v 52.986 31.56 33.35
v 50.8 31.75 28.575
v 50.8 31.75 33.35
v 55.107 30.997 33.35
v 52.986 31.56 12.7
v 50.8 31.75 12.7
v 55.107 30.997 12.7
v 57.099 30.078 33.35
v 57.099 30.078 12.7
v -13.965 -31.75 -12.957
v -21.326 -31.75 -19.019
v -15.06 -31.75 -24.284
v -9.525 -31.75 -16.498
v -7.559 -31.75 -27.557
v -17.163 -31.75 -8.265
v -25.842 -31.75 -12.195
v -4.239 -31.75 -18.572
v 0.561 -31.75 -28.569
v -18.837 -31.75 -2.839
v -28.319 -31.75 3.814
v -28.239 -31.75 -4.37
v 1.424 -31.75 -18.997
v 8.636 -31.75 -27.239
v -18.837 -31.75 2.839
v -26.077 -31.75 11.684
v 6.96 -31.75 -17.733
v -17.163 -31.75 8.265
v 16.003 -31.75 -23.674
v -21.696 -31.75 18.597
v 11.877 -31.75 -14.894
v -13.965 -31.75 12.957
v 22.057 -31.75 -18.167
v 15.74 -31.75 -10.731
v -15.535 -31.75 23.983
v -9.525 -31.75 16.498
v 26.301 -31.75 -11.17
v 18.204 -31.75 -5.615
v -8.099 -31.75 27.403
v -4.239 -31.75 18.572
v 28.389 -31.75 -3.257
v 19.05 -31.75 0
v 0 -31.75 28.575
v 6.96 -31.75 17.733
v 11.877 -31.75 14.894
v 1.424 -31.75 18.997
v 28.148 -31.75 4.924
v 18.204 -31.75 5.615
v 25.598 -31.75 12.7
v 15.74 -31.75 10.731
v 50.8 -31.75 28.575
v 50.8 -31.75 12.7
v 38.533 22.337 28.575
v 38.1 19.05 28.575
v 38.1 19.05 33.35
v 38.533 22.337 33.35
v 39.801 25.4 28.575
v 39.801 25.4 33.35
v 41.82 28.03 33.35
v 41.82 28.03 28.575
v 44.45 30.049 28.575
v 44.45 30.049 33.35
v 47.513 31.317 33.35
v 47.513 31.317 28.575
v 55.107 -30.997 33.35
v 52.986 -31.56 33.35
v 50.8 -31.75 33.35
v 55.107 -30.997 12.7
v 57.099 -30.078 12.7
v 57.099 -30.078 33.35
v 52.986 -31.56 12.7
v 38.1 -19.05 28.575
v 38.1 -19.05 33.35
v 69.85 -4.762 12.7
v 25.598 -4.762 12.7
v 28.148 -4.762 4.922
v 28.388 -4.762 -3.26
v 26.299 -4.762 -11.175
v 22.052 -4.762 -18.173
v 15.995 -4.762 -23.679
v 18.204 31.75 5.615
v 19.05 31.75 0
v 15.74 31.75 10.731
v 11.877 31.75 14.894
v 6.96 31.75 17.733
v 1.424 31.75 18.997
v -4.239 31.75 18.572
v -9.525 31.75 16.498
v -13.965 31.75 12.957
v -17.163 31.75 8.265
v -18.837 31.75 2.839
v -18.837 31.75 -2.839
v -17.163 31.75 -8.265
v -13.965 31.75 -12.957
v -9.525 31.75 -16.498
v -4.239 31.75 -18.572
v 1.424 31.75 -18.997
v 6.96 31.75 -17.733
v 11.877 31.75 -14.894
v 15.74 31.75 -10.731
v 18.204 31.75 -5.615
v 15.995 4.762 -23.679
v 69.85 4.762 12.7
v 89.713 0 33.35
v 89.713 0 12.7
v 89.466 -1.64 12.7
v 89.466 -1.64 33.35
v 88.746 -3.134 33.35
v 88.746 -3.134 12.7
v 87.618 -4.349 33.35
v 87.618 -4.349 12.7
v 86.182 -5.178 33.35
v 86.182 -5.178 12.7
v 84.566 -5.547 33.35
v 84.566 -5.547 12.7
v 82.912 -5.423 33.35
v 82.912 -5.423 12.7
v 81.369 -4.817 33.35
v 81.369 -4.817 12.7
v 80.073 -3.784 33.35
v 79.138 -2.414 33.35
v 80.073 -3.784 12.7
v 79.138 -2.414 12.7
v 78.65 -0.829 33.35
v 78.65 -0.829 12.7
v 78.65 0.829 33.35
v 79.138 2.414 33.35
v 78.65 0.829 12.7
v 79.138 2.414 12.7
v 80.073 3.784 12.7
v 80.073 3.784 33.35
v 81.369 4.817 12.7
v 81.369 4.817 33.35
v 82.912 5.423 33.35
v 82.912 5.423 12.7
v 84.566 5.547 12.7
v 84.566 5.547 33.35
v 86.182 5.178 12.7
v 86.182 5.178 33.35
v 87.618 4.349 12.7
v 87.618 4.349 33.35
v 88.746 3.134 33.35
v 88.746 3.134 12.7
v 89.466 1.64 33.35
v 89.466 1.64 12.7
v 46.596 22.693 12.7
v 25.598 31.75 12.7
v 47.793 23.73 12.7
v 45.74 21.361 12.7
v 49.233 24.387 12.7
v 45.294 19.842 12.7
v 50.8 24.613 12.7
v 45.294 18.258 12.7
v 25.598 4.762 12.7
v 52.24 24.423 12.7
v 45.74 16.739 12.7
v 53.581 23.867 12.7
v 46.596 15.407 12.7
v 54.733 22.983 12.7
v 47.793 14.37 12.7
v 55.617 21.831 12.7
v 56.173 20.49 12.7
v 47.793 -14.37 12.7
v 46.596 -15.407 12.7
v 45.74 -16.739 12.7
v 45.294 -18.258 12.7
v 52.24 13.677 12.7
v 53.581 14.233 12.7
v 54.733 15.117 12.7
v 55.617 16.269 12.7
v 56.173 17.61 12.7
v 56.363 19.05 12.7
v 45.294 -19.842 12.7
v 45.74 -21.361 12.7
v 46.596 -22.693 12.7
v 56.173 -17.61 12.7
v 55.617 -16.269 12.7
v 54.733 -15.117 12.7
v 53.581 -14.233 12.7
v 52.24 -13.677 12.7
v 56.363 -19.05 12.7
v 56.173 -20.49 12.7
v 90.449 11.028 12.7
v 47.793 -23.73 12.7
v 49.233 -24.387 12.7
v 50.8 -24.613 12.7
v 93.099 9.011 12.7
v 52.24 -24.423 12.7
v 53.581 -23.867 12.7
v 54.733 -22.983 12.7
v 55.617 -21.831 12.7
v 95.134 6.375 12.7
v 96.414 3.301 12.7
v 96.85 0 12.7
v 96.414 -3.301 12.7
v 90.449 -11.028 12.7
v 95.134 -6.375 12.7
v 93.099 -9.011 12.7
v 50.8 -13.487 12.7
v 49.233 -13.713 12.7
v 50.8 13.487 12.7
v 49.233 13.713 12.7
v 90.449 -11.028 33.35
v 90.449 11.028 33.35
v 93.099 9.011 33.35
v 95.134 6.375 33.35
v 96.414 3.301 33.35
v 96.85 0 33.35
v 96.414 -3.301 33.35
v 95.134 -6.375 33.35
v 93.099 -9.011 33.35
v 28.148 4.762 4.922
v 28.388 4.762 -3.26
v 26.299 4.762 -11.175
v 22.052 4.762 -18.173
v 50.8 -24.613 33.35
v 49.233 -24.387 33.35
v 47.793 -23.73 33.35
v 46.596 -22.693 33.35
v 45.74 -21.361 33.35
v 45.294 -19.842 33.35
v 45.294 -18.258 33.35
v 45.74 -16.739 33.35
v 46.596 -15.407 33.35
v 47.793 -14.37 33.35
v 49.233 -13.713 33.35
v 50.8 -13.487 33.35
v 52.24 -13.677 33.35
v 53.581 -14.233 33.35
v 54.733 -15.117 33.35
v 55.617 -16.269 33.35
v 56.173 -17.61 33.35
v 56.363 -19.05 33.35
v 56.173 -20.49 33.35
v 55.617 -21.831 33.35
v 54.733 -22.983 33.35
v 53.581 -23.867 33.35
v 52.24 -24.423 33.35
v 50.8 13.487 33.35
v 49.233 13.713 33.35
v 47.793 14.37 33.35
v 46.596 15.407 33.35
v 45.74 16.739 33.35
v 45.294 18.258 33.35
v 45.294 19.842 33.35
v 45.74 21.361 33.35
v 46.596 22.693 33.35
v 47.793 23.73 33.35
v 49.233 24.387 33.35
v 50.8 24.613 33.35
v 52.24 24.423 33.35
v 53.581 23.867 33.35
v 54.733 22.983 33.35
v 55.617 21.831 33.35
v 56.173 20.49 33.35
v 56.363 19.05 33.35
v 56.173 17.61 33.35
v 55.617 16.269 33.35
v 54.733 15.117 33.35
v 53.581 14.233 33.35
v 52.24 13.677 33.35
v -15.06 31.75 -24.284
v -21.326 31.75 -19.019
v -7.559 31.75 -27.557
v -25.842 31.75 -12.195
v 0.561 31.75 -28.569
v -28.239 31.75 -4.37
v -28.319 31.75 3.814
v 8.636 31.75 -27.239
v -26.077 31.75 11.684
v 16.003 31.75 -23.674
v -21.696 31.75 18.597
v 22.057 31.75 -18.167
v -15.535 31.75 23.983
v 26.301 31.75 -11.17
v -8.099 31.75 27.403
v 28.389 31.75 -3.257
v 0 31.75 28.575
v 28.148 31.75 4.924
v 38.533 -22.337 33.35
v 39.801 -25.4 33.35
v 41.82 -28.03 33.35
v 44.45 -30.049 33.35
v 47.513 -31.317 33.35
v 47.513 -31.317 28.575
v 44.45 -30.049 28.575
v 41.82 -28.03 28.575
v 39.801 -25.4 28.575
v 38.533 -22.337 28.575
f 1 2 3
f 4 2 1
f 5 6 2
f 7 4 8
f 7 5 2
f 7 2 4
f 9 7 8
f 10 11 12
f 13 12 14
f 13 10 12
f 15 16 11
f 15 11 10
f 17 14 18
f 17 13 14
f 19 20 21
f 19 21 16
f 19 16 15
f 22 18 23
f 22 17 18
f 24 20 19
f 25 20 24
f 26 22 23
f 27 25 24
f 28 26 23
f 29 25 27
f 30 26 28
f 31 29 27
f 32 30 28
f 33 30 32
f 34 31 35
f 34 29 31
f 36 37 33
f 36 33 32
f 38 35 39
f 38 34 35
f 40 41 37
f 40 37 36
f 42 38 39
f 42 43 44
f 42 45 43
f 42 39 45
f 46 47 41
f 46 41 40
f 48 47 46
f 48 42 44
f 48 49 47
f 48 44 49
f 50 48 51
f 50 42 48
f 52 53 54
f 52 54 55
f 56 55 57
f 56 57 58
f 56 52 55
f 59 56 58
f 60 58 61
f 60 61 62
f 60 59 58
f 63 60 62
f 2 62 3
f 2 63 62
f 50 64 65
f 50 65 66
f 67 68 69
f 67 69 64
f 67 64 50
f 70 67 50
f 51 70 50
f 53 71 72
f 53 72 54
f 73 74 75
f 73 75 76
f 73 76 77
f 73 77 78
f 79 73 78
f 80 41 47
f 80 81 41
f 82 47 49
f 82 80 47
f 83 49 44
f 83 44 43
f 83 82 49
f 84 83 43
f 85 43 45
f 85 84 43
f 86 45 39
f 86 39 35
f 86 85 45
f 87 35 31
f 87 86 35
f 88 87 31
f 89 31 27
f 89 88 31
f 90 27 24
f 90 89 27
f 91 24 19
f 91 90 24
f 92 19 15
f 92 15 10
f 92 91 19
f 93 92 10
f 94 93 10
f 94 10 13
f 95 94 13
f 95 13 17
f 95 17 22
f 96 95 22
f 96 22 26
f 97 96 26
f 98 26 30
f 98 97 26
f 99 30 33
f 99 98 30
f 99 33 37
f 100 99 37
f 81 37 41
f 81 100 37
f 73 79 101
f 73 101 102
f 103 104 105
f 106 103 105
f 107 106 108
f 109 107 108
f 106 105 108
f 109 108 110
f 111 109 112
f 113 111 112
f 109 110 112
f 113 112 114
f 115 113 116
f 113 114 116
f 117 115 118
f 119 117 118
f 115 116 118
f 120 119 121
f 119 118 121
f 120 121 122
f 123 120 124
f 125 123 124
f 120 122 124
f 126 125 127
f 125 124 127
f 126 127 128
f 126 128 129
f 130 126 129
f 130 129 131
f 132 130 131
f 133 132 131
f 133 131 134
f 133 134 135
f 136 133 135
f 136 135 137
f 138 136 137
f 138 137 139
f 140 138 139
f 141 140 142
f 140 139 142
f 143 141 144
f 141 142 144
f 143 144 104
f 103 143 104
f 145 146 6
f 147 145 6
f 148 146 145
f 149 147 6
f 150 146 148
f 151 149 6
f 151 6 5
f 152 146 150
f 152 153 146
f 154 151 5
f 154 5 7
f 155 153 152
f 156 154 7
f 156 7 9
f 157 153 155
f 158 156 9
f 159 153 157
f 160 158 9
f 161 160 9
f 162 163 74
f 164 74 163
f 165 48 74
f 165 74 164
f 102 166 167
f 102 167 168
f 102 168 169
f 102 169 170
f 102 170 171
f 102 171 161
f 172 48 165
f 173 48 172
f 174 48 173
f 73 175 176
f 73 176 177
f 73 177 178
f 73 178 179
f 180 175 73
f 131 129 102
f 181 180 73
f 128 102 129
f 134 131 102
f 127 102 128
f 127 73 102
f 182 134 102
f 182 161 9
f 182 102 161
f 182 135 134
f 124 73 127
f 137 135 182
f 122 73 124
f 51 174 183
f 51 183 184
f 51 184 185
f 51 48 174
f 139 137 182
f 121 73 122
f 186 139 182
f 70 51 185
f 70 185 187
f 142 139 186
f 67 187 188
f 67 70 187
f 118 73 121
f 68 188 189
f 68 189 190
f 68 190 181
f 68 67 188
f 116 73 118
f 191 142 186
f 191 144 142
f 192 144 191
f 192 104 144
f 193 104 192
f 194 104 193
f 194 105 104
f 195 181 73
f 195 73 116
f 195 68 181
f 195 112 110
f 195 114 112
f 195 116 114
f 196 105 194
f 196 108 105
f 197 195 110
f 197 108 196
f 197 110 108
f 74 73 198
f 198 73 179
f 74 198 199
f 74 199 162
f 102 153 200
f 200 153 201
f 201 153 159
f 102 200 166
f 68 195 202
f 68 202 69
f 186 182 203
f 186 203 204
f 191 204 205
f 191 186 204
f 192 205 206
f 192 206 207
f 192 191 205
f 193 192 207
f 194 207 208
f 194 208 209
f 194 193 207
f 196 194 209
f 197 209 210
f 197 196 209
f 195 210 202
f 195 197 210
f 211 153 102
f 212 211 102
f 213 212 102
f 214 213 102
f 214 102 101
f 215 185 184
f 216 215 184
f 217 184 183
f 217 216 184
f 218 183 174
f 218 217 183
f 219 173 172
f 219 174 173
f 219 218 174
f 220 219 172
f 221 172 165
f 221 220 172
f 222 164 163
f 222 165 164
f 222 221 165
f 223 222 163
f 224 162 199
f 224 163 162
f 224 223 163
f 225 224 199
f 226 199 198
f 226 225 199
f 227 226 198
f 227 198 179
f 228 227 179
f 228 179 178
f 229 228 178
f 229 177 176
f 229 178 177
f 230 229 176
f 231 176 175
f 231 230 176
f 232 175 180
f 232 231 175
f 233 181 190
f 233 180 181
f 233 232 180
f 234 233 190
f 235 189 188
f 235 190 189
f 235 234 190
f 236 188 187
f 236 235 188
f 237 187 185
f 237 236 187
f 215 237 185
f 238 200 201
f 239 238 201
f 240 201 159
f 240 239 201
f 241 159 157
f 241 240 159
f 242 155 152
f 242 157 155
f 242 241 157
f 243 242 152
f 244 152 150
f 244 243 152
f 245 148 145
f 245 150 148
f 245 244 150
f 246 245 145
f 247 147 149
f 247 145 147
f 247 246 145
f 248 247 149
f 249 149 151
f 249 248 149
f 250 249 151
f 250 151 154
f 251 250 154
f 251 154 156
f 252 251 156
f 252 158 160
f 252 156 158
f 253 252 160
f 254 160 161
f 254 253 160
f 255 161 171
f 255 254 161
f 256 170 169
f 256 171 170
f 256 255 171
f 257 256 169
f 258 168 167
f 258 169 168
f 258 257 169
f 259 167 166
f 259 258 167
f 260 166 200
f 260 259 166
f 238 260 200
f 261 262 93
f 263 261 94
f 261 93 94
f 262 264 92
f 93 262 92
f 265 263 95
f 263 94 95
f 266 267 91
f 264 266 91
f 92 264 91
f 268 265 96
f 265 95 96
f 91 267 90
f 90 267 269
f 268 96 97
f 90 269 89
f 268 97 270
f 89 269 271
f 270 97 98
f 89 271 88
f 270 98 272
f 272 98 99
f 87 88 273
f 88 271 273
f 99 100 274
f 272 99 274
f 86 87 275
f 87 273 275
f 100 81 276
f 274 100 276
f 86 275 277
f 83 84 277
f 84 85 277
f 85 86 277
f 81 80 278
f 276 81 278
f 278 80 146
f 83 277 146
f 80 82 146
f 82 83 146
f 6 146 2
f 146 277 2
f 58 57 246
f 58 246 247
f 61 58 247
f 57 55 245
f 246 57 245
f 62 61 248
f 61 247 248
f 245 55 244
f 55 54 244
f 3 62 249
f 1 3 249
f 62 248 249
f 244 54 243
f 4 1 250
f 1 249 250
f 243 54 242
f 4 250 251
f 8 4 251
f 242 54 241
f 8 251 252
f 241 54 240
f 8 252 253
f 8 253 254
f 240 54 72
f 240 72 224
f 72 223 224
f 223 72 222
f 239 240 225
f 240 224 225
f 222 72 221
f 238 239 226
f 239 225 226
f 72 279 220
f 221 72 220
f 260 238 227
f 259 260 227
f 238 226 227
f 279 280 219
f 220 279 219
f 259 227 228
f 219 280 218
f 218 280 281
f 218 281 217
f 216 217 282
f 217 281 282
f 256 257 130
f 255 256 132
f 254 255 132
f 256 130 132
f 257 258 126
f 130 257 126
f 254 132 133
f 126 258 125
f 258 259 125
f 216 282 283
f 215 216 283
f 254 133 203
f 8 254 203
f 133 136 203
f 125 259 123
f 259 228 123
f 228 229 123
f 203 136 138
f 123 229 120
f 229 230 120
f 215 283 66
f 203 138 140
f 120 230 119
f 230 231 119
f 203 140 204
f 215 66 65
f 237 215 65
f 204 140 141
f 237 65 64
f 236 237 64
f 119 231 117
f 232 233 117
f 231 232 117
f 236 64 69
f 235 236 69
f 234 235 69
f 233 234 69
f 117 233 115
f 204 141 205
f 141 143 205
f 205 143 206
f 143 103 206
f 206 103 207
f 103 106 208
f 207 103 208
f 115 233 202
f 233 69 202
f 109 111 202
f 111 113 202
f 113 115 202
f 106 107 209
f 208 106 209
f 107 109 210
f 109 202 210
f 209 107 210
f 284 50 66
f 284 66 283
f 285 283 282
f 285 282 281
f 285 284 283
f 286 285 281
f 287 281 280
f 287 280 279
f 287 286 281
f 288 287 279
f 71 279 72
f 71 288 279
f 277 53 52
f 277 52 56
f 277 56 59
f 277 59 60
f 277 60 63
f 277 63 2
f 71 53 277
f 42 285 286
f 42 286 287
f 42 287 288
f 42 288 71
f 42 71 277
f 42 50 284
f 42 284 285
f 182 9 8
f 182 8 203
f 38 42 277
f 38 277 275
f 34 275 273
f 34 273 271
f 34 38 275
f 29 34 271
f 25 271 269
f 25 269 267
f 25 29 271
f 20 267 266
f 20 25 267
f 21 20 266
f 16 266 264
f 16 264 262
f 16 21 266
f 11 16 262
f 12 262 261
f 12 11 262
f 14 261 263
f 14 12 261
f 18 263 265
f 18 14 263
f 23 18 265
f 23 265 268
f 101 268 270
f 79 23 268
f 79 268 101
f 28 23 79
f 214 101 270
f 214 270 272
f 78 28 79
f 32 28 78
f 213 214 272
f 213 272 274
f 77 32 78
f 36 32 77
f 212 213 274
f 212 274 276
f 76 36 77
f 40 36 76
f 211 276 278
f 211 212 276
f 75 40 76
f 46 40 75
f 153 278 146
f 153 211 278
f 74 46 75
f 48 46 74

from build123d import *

# Parameters (mm, degrees)
F0_R     = 19.05
F1_DEPTH = 31.75
F2_R     = 5.5626
F3_DEPTH = 20.6502
F4_DEPTH = 57.151
F6_DEPTH = 4.7625


with BuildPart() as f1:
    # F0 (on Front) → F1 (new body, symmetric)
    with BuildSketch(Plane.XZ):
        with BuildLine():
            Line((50.8, 28.575), (0, 28.575))
            ThreePointArc((0, 28.575), (-15.0603473566, -24.2840804335), (25.5976683508, 12.7))
            Line((25.5976683508, 12.7), (50.8, 12.7))
            Line((50.8, 12.7), (50.8, 28.575))
        make_face()
        Circle(F0_R, mode=Mode.SUBTRACT)
    extrude(amount=F1_DEPTH, both=True)

    # F2 (on face) → F3 (join)
    with BuildSketch(Plane(origin=(0, 0, 12.7), x_dir=(1, 0, 0), z_dir=(0, 0, -1))):
        with BuildLine():
            Line((50.8, 24.6126), (50.8, 31.75))
            ThreePointArc((50.8, 31.75), (41.8197438789, 28.0302561211), (38.1, 19.05))
            Line((38.1, 19.05), (38.1, -19.05))
            ThreePointArc((38.1, -19.05), (41.8197438789, -28.0302561211), (50.8, -31.75))
            Line((50.8, -31.75), (50.8, -24.6126))
            ThreePointArc((50.8, -24.6126), (45.2374, -19.05), (50.8, -13.4874))
            Line((50.8, -13.4874), (50.8, 13.4874))
            ThreePointArc((50.8, 13.4874), (45.2374, 19.05), (50.8, 24.6126))
        make_face()
        with BuildLine():
            Line((90.4493554441, 11.0277214642), (57.0991554441, 30.0777214642))
            ThreePointArc((57.0991554441, 30.0777214642), (54.0586759125, 31.3248128824), (50.8, 31.75))
            Line((50.8, 31.75), (50.8, 24.6126))
            ThreePointArc((50.8, 24.6126), (54.733352181, 22.983352181), (56.3626, 19.05))
            ThreePointArc((56.3626, 19.05), (54.733352181, 15.116647819), (50.8, 13.4874))
            Line((50.8, 13.4874), (50.8, -13.4874))
            ThreePointArc((50.8, -13.4874), (54.733352181, -15.116647819), (56.3626, -19.05))
            ThreePointArc((56.3626, -19.05), (54.733352181, -22.983352181), (50.8, -24.6126))
            Line((50.8, -24.6126), (50.8, -31.75))
            ThreePointArc((50.8, -31.75), (54.0586759125, -31.3248128824), (57.0991554441, -30.0777214642))
            Line((57.0991554441, -30.0777214642), (90.4493554441, -11.0277214642))
            ThreePointArc((90.4493554441, -11.0277214642), (96.8502, 0), (90.4493554441, 11.0277214642))
        make_face()
        with Locations((84.1502, 0)):
            Circle(F2_R, mode=Mode.SUBTRACT)
    extrude(amount=-F3_DEPTH)

    # F4 (cut, through all): faces of the model
    f4_faces = [f1.faces().sort_by_distance(p)[0] for p in [
        (48.4391592362, 19.05, 28.575),
        (48.4391592362, -19.05, 28.575),
    ]]
    extrude(f4_faces, amount=-F4_DEPTH, mode=Mode.SUBTRACT)

    # F5 (on Front) → F6 (join, symmetric)
    with BuildSketch(Plane.XZ):
        with BuildLine():
            ThreePointArc((25.5976683508, 12.7), (27.6286795727, -7.2929205446), (15.9950252975, -23.6788891364))
            Line((15.9950252975, -23.6788891364), (69.85, 12.7))
            Line((69.85, 12.7), (25.5976683508, 12.7))
        make_face()
    extrude(amount=F6_DEPTH, both=True)


solid = f1.part
